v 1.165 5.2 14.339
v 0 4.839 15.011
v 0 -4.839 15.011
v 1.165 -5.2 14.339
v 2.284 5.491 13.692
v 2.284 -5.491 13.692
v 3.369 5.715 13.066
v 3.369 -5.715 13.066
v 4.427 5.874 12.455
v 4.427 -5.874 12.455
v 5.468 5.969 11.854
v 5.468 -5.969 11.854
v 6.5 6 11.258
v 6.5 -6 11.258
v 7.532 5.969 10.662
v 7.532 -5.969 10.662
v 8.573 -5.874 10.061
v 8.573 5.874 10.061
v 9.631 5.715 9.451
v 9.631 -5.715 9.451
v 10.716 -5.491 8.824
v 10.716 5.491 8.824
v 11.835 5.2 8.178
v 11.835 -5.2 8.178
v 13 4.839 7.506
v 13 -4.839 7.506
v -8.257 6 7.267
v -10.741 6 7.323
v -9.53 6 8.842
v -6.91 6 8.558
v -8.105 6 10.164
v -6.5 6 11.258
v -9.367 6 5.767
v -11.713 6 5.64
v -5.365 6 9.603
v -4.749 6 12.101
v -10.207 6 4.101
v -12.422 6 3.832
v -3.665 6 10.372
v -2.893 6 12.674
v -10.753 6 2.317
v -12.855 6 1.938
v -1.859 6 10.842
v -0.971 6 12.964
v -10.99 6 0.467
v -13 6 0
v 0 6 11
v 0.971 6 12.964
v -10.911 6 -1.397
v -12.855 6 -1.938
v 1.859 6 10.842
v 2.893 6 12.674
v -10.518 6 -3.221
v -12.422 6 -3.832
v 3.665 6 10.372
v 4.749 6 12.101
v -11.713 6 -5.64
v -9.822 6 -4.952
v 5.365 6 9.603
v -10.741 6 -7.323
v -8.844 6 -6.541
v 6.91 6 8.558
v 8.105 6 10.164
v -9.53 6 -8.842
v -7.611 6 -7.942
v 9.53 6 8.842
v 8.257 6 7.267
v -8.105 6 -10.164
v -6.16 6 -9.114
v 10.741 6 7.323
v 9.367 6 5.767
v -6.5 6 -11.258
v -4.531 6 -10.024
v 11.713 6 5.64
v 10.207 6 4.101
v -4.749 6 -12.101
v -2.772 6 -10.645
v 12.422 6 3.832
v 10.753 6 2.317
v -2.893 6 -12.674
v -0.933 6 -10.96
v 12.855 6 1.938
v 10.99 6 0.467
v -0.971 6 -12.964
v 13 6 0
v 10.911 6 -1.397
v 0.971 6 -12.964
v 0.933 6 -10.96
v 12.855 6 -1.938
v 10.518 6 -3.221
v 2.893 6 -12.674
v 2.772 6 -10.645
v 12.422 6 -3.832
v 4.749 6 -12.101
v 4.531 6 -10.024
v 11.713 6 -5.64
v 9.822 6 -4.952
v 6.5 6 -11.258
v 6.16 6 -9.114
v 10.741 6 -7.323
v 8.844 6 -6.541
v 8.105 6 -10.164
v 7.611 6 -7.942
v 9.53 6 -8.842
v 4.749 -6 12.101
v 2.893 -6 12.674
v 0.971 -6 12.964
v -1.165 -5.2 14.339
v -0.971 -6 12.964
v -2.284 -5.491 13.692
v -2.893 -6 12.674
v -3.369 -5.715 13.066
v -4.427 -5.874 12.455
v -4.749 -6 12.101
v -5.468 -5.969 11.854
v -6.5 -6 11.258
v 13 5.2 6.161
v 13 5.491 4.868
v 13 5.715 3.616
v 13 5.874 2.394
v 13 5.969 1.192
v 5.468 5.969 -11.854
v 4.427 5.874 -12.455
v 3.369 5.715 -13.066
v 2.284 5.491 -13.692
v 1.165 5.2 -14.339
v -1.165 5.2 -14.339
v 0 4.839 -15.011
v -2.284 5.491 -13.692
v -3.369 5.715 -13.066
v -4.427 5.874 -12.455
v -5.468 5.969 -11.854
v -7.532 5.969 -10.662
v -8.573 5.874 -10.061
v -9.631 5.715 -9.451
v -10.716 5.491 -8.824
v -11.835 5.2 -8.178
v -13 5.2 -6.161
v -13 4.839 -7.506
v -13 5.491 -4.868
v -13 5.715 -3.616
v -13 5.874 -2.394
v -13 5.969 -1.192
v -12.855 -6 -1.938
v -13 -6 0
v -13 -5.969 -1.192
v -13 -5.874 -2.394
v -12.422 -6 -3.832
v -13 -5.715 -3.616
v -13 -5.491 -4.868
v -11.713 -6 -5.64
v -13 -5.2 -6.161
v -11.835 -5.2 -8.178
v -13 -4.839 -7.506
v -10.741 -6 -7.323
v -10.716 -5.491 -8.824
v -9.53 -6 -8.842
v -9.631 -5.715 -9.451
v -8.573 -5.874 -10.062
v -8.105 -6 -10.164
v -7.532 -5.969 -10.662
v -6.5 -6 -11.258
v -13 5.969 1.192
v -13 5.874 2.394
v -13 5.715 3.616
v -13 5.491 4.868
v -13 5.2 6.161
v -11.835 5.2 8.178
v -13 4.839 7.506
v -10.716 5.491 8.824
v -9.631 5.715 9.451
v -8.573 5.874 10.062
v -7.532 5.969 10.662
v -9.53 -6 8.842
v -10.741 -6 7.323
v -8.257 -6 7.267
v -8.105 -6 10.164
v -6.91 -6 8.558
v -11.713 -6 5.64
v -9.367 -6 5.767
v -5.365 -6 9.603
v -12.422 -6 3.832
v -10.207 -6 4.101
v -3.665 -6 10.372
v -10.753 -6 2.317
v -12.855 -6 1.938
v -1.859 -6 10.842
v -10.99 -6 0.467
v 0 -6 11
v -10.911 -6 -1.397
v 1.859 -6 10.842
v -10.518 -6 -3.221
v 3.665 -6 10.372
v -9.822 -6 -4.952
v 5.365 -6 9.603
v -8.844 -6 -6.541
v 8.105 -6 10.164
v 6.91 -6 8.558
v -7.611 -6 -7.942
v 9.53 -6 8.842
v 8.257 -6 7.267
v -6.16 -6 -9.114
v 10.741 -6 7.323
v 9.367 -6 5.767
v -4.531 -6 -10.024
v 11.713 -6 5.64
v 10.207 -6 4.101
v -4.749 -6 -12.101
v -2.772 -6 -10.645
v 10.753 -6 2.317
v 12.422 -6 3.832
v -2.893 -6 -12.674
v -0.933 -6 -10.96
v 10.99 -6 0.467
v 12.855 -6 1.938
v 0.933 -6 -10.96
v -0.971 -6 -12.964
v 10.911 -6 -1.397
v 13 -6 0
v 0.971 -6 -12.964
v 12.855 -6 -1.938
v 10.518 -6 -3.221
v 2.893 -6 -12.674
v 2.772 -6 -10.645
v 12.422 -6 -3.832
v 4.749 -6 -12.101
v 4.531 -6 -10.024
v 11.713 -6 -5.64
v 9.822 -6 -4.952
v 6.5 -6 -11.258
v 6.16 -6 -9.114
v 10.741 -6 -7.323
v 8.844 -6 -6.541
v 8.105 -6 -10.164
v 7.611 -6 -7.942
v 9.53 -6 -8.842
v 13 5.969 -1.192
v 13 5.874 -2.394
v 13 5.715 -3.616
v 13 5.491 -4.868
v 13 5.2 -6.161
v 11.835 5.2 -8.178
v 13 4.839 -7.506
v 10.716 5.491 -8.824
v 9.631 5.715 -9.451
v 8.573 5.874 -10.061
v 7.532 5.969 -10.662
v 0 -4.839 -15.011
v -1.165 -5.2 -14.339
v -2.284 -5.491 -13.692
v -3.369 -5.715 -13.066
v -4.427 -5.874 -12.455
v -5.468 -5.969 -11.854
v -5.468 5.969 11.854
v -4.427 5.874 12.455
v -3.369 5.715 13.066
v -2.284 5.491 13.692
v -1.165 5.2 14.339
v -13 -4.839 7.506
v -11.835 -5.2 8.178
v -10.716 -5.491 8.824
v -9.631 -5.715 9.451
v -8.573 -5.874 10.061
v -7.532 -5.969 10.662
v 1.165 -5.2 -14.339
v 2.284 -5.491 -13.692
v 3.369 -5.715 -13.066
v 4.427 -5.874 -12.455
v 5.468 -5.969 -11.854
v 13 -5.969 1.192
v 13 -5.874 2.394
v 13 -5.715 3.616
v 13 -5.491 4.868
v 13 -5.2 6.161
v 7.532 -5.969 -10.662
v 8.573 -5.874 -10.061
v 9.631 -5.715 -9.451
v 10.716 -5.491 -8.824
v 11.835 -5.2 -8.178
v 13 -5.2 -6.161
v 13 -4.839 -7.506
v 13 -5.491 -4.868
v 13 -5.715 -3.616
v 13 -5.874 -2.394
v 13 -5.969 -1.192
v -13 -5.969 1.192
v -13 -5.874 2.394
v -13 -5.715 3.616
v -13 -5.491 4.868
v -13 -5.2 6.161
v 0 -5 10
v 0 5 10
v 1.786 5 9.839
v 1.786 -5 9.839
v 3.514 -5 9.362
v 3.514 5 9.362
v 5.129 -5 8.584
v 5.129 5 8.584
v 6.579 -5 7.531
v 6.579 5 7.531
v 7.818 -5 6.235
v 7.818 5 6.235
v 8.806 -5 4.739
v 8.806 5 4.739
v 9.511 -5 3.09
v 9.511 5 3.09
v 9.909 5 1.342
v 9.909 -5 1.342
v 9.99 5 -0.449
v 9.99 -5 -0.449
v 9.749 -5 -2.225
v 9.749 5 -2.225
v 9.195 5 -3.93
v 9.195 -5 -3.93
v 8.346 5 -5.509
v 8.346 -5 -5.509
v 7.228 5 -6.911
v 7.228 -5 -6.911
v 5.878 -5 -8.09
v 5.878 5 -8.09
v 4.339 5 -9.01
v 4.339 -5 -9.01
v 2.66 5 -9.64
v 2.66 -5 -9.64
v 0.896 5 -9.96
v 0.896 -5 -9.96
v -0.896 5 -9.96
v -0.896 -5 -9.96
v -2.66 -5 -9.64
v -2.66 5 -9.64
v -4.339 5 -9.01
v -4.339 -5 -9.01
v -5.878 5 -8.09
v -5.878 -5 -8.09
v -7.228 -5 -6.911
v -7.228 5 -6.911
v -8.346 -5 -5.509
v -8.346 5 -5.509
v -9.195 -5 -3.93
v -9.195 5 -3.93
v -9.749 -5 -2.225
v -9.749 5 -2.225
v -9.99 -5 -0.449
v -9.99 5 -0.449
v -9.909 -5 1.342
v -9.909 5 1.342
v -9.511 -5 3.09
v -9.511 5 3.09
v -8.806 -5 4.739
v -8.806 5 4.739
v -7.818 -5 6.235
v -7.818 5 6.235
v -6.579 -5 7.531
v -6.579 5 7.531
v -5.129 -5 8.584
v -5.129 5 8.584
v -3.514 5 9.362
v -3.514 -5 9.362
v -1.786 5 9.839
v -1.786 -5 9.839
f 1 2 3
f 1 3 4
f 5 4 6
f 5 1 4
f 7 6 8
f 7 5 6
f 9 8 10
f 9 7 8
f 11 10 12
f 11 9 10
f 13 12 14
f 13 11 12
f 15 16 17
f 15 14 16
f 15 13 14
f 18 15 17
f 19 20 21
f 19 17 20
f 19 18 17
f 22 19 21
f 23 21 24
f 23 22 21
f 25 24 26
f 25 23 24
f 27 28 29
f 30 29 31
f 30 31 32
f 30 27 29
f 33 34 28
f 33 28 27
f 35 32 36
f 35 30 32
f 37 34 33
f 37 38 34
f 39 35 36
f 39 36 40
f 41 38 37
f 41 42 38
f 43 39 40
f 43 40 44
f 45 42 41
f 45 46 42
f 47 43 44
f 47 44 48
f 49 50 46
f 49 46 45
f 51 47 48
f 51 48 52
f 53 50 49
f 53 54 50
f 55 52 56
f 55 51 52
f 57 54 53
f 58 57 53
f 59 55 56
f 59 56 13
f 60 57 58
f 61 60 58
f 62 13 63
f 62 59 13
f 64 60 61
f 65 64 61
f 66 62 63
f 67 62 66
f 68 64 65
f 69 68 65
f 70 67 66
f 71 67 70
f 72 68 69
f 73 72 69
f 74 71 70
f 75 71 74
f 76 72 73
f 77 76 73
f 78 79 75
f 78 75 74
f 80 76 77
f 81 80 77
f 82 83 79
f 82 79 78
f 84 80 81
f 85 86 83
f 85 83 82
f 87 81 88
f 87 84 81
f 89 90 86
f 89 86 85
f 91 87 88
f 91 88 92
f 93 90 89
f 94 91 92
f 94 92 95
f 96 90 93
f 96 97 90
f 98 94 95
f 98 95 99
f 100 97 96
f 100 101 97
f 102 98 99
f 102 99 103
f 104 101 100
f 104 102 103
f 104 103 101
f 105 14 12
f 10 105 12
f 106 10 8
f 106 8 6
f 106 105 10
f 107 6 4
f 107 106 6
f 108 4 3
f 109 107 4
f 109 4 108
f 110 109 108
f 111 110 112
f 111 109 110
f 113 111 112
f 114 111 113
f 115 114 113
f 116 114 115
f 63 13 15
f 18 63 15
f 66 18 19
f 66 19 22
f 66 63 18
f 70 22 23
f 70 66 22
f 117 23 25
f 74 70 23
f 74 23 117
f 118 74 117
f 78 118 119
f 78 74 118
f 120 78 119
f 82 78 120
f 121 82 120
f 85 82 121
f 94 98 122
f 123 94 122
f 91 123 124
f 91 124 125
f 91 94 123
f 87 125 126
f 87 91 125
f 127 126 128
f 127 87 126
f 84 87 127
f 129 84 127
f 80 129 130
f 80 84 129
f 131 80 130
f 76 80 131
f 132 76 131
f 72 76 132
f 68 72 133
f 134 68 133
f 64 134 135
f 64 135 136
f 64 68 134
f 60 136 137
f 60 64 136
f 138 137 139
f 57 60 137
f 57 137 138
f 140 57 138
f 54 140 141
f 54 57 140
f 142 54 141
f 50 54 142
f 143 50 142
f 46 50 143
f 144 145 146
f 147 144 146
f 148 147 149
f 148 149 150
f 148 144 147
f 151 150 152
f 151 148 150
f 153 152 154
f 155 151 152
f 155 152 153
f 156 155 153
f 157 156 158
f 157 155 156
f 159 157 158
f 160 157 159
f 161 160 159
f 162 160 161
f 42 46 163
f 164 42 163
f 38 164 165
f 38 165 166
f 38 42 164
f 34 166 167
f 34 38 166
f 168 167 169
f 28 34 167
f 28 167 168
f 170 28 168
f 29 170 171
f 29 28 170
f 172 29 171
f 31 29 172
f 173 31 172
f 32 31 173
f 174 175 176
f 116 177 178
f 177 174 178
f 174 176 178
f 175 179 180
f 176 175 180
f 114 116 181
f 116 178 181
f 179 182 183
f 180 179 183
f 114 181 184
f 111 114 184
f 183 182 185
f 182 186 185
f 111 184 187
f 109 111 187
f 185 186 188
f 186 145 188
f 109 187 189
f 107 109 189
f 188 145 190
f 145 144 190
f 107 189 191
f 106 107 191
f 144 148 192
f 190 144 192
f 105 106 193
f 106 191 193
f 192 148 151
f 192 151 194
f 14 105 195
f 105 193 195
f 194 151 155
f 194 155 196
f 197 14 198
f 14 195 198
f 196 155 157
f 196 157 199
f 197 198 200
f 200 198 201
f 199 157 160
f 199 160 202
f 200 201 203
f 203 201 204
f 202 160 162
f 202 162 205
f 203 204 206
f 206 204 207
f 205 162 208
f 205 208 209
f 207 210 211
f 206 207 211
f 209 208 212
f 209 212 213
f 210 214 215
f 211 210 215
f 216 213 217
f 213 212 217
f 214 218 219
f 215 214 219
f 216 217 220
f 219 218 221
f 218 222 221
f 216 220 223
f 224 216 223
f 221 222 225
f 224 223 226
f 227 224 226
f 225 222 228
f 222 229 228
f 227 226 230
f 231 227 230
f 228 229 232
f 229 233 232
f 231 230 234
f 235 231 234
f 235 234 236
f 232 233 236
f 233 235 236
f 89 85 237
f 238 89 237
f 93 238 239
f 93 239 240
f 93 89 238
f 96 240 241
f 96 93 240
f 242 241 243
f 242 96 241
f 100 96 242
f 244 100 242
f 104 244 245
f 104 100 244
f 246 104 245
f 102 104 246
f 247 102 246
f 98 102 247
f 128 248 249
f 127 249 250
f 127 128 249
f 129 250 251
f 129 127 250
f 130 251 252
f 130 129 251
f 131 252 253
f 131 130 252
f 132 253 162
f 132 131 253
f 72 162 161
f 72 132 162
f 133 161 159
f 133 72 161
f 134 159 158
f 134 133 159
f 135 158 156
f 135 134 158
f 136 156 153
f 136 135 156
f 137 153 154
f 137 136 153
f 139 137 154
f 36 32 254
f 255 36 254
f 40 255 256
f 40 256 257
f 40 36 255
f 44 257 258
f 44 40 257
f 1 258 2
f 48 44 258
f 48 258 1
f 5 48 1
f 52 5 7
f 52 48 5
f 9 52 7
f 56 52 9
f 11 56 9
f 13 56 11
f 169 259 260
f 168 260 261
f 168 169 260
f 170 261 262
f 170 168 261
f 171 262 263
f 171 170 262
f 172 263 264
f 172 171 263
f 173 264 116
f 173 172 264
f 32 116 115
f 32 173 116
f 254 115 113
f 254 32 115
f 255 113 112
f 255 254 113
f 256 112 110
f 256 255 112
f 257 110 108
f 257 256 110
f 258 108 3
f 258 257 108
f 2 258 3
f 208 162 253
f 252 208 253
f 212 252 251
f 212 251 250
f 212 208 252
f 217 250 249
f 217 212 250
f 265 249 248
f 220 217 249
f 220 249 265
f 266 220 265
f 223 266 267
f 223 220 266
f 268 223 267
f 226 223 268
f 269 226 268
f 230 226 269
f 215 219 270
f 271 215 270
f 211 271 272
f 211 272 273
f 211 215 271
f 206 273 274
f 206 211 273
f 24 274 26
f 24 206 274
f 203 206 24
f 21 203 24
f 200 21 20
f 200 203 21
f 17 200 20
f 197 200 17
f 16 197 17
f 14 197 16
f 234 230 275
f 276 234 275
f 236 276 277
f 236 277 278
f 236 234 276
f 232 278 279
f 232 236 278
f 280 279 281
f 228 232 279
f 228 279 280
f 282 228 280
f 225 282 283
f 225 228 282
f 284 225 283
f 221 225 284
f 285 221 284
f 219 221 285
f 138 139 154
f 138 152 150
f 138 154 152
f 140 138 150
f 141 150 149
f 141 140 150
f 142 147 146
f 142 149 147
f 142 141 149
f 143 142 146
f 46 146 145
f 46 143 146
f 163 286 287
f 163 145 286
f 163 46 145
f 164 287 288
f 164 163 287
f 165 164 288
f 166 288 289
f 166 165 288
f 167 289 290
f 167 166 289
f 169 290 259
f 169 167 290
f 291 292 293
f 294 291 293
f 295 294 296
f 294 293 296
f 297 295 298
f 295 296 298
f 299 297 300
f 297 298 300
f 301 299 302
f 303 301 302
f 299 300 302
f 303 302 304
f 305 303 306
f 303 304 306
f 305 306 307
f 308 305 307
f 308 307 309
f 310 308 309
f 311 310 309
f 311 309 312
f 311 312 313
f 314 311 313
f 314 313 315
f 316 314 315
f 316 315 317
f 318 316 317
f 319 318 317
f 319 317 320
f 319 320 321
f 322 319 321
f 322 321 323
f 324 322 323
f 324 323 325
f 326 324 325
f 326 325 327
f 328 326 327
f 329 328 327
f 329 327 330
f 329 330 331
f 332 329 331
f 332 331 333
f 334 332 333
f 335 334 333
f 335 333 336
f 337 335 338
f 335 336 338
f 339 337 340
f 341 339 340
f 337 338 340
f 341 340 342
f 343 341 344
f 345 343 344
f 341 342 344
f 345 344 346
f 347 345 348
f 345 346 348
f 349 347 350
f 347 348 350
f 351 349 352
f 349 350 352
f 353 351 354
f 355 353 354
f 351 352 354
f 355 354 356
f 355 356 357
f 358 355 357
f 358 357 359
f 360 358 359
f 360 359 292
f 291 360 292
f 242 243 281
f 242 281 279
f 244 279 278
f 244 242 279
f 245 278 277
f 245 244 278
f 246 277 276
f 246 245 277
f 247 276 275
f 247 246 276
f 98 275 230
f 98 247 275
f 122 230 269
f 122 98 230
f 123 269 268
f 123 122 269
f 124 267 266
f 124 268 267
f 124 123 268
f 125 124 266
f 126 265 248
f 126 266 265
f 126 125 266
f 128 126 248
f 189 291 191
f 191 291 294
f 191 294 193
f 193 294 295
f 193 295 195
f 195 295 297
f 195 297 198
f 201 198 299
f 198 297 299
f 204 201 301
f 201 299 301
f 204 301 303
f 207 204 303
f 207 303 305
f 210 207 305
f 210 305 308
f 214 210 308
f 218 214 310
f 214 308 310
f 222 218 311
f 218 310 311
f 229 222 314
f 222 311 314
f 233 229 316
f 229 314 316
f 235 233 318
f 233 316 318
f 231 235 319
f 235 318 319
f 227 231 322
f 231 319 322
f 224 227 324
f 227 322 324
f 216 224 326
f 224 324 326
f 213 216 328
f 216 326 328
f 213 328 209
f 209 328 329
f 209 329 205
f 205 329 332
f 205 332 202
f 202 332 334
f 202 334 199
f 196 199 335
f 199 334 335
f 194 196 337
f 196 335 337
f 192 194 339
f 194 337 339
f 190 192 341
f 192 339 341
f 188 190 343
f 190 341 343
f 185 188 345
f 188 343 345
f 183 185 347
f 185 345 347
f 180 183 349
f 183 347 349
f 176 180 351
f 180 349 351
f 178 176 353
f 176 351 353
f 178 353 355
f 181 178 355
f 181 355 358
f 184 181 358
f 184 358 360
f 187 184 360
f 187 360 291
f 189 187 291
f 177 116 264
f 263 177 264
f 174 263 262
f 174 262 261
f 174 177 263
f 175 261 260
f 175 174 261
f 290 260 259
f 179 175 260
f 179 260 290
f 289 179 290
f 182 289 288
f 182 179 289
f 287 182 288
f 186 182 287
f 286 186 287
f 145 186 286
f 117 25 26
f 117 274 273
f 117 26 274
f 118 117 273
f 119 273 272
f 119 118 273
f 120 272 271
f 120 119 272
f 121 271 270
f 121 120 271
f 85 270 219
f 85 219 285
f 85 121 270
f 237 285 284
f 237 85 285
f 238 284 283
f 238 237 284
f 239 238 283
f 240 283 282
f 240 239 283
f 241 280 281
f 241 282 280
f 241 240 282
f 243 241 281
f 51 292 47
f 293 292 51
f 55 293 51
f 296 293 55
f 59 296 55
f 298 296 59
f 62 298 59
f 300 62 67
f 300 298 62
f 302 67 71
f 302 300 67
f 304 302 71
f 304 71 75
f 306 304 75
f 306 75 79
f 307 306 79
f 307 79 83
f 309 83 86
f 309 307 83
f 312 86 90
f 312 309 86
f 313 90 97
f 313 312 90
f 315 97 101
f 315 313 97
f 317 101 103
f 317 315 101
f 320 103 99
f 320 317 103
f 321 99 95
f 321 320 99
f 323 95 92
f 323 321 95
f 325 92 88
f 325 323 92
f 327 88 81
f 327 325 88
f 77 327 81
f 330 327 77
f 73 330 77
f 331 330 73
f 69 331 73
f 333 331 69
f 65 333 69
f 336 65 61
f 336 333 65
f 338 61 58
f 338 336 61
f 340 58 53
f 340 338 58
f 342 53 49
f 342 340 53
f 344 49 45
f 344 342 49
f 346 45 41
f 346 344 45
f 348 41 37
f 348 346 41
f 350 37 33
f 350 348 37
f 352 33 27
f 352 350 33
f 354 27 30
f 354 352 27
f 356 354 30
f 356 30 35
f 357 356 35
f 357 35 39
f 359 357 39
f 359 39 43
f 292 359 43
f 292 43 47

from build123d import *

# Parameters (mm, degrees)
BOSS_EXTRUDE1_DEPTH     = 6
SKETCH2_OUTSIDE_W       = 77.868
SKETCH2_OUTSIDE_H       = 81.89
SKETCH2_OUTSIDE_R       = 13
CUT_EXTRUDE1_DEPTH      = 12
CUT_EXTRUDE1_DRAFT      = -60
MIRROR1_COPY_1_SKETCH_W = 77.868
MIRROR1_COPY_1_SKETCH_H = 81.89
MIRROR1_COPY_1_SKETCH_R = 13
MIRROR1_COPY_1_DEPTH    = 12
MIRROR1_COPY_1_DRAFT    = -60
SKETCH3_R               = 10
CUT_EXTRUDE2_DEPTH      = 24.202011407
CHAMFER1_SIZE           = 1


with BuildPart() as part:
    # Sketch1 → Boss-Extrude1 (new, symmetric)
    with BuildSketch(Plane(origin=(0, 0, 0), x_dir=(1, 0, 0), z_dir=(0, 1, 0))):
        Polygon((13, 7.505553499), (0, 15.011106999), (-13, 7.505553499), (-13, -7.505553499), (0, -15.011106999), (13, -7.505553499), align=None)
    extrude(amount=BOSS_EXTRUDE1_DEPTH, both=True)


with BuildPart() as cut_extrude1_tool:
    # Sketch2 outside → Cut-Extrude1 (with draft: the straight prism first)
    with BuildSketch(Plane(origin=(0, 6, 0), x_dir=(1, 0, 0), z_dir=(0, 1, 0))):
        Rectangle(SKETCH2_OUTSIDE_W, SKETCH2_OUTSIDE_H)
        Circle(SKETCH2_OUTSIDE_R, mode=Mode.SUBTRACT)
    extrude(amount=-CUT_EXTRUDE1_DEPTH)
    # Cut-Extrude1: the draft: its side faces are tilted about the plane it starts from
    cut_extrude1_sides = [cut_extrude1_tool.faces().sort_by_distance(p)[0] for p in [
        (0, 0, 40.945),
        (38.934, 0, 0),
        (0, 0, -40.945),
        (-38.934, 0, 0),
        (-13, 0, 0),
    ]]
    draft(cut_extrude1_sides, Plane(origin=(0, 6, 0), x_dir=(1, 0, 0), z_dir=(0, 1, 0)), CUT_EXTRUDE1_DRAFT)


with BuildPart() as part_1:
    add(part.part)

    # Cut-Extrude1: cut by cut_extrude1_tool
    add(cut_extrude1_tool.part, mode=Mode.SUBTRACT)


with BuildPart() as mirror1_copy_1_tool:
    # Mirror1 copy 1 sketch → Mirror1 copy 1 (with draft: the straight prism first)
    with BuildSketch(Plane.XZ.offset(6)):
        Rectangle(MIRROR1_COPY_1_SKETCH_W, MIRROR1_COPY_1_SKETCH_H)
        Circle(MIRROR1_COPY_1_SKETCH_R, mode=Mode.SUBTRACT)
    extrude(amount=-MIRROR1_COPY_1_DEPTH)
    # Mirror1 copy 1: the draft: its side faces are tilted about the plane it starts from
    mirror1_copy_1_sides = [mirror1_copy_1_tool.faces().sort_by_distance(p)[0] for p in [
        (0, 0, 40.945),
        (38.934, 0, 0),
        (0, 0, -40.945),
        (-38.934, 0, 0),
        (-13, 0, 0),
    ]]
    draft(mirror1_copy_1_sides, Plane.XZ.offset(6), MIRROR1_COPY_1_DRAFT)


with BuildPart() as part_2:
    add(part_1.part)

    # Mirror1 copy 1: cut by mirror1_copy_1_tool
    add(mirror1_copy_1_tool.part, mode=Mode.SUBTRACT)

    # Sketch3 → Cut-Extrude2 (cut, through all)
    with BuildSketch(Plane(origin=(0, 6, 0), x_dir=(1, 0, 0), z_dir=(0, 1, 0))):
        with Locations(Location((0, 0, 0), (0, 0, 270))):
            Circle(SKETCH3_R)
    extrude(amount=-CUT_EXTRUDE2_DEPTH, mode=Mode.SUBTRACT)

    # Chamfer1
    chamfer1_edges = [part_2.edges().sort_by_distance(p)[0] for p in [
        (0, -6, -10),
        (0, 6, -10),
    ]]
    chamfer(chamfer1_edges, length=CHAMFER1_SIZE)


solid = part_2.part
